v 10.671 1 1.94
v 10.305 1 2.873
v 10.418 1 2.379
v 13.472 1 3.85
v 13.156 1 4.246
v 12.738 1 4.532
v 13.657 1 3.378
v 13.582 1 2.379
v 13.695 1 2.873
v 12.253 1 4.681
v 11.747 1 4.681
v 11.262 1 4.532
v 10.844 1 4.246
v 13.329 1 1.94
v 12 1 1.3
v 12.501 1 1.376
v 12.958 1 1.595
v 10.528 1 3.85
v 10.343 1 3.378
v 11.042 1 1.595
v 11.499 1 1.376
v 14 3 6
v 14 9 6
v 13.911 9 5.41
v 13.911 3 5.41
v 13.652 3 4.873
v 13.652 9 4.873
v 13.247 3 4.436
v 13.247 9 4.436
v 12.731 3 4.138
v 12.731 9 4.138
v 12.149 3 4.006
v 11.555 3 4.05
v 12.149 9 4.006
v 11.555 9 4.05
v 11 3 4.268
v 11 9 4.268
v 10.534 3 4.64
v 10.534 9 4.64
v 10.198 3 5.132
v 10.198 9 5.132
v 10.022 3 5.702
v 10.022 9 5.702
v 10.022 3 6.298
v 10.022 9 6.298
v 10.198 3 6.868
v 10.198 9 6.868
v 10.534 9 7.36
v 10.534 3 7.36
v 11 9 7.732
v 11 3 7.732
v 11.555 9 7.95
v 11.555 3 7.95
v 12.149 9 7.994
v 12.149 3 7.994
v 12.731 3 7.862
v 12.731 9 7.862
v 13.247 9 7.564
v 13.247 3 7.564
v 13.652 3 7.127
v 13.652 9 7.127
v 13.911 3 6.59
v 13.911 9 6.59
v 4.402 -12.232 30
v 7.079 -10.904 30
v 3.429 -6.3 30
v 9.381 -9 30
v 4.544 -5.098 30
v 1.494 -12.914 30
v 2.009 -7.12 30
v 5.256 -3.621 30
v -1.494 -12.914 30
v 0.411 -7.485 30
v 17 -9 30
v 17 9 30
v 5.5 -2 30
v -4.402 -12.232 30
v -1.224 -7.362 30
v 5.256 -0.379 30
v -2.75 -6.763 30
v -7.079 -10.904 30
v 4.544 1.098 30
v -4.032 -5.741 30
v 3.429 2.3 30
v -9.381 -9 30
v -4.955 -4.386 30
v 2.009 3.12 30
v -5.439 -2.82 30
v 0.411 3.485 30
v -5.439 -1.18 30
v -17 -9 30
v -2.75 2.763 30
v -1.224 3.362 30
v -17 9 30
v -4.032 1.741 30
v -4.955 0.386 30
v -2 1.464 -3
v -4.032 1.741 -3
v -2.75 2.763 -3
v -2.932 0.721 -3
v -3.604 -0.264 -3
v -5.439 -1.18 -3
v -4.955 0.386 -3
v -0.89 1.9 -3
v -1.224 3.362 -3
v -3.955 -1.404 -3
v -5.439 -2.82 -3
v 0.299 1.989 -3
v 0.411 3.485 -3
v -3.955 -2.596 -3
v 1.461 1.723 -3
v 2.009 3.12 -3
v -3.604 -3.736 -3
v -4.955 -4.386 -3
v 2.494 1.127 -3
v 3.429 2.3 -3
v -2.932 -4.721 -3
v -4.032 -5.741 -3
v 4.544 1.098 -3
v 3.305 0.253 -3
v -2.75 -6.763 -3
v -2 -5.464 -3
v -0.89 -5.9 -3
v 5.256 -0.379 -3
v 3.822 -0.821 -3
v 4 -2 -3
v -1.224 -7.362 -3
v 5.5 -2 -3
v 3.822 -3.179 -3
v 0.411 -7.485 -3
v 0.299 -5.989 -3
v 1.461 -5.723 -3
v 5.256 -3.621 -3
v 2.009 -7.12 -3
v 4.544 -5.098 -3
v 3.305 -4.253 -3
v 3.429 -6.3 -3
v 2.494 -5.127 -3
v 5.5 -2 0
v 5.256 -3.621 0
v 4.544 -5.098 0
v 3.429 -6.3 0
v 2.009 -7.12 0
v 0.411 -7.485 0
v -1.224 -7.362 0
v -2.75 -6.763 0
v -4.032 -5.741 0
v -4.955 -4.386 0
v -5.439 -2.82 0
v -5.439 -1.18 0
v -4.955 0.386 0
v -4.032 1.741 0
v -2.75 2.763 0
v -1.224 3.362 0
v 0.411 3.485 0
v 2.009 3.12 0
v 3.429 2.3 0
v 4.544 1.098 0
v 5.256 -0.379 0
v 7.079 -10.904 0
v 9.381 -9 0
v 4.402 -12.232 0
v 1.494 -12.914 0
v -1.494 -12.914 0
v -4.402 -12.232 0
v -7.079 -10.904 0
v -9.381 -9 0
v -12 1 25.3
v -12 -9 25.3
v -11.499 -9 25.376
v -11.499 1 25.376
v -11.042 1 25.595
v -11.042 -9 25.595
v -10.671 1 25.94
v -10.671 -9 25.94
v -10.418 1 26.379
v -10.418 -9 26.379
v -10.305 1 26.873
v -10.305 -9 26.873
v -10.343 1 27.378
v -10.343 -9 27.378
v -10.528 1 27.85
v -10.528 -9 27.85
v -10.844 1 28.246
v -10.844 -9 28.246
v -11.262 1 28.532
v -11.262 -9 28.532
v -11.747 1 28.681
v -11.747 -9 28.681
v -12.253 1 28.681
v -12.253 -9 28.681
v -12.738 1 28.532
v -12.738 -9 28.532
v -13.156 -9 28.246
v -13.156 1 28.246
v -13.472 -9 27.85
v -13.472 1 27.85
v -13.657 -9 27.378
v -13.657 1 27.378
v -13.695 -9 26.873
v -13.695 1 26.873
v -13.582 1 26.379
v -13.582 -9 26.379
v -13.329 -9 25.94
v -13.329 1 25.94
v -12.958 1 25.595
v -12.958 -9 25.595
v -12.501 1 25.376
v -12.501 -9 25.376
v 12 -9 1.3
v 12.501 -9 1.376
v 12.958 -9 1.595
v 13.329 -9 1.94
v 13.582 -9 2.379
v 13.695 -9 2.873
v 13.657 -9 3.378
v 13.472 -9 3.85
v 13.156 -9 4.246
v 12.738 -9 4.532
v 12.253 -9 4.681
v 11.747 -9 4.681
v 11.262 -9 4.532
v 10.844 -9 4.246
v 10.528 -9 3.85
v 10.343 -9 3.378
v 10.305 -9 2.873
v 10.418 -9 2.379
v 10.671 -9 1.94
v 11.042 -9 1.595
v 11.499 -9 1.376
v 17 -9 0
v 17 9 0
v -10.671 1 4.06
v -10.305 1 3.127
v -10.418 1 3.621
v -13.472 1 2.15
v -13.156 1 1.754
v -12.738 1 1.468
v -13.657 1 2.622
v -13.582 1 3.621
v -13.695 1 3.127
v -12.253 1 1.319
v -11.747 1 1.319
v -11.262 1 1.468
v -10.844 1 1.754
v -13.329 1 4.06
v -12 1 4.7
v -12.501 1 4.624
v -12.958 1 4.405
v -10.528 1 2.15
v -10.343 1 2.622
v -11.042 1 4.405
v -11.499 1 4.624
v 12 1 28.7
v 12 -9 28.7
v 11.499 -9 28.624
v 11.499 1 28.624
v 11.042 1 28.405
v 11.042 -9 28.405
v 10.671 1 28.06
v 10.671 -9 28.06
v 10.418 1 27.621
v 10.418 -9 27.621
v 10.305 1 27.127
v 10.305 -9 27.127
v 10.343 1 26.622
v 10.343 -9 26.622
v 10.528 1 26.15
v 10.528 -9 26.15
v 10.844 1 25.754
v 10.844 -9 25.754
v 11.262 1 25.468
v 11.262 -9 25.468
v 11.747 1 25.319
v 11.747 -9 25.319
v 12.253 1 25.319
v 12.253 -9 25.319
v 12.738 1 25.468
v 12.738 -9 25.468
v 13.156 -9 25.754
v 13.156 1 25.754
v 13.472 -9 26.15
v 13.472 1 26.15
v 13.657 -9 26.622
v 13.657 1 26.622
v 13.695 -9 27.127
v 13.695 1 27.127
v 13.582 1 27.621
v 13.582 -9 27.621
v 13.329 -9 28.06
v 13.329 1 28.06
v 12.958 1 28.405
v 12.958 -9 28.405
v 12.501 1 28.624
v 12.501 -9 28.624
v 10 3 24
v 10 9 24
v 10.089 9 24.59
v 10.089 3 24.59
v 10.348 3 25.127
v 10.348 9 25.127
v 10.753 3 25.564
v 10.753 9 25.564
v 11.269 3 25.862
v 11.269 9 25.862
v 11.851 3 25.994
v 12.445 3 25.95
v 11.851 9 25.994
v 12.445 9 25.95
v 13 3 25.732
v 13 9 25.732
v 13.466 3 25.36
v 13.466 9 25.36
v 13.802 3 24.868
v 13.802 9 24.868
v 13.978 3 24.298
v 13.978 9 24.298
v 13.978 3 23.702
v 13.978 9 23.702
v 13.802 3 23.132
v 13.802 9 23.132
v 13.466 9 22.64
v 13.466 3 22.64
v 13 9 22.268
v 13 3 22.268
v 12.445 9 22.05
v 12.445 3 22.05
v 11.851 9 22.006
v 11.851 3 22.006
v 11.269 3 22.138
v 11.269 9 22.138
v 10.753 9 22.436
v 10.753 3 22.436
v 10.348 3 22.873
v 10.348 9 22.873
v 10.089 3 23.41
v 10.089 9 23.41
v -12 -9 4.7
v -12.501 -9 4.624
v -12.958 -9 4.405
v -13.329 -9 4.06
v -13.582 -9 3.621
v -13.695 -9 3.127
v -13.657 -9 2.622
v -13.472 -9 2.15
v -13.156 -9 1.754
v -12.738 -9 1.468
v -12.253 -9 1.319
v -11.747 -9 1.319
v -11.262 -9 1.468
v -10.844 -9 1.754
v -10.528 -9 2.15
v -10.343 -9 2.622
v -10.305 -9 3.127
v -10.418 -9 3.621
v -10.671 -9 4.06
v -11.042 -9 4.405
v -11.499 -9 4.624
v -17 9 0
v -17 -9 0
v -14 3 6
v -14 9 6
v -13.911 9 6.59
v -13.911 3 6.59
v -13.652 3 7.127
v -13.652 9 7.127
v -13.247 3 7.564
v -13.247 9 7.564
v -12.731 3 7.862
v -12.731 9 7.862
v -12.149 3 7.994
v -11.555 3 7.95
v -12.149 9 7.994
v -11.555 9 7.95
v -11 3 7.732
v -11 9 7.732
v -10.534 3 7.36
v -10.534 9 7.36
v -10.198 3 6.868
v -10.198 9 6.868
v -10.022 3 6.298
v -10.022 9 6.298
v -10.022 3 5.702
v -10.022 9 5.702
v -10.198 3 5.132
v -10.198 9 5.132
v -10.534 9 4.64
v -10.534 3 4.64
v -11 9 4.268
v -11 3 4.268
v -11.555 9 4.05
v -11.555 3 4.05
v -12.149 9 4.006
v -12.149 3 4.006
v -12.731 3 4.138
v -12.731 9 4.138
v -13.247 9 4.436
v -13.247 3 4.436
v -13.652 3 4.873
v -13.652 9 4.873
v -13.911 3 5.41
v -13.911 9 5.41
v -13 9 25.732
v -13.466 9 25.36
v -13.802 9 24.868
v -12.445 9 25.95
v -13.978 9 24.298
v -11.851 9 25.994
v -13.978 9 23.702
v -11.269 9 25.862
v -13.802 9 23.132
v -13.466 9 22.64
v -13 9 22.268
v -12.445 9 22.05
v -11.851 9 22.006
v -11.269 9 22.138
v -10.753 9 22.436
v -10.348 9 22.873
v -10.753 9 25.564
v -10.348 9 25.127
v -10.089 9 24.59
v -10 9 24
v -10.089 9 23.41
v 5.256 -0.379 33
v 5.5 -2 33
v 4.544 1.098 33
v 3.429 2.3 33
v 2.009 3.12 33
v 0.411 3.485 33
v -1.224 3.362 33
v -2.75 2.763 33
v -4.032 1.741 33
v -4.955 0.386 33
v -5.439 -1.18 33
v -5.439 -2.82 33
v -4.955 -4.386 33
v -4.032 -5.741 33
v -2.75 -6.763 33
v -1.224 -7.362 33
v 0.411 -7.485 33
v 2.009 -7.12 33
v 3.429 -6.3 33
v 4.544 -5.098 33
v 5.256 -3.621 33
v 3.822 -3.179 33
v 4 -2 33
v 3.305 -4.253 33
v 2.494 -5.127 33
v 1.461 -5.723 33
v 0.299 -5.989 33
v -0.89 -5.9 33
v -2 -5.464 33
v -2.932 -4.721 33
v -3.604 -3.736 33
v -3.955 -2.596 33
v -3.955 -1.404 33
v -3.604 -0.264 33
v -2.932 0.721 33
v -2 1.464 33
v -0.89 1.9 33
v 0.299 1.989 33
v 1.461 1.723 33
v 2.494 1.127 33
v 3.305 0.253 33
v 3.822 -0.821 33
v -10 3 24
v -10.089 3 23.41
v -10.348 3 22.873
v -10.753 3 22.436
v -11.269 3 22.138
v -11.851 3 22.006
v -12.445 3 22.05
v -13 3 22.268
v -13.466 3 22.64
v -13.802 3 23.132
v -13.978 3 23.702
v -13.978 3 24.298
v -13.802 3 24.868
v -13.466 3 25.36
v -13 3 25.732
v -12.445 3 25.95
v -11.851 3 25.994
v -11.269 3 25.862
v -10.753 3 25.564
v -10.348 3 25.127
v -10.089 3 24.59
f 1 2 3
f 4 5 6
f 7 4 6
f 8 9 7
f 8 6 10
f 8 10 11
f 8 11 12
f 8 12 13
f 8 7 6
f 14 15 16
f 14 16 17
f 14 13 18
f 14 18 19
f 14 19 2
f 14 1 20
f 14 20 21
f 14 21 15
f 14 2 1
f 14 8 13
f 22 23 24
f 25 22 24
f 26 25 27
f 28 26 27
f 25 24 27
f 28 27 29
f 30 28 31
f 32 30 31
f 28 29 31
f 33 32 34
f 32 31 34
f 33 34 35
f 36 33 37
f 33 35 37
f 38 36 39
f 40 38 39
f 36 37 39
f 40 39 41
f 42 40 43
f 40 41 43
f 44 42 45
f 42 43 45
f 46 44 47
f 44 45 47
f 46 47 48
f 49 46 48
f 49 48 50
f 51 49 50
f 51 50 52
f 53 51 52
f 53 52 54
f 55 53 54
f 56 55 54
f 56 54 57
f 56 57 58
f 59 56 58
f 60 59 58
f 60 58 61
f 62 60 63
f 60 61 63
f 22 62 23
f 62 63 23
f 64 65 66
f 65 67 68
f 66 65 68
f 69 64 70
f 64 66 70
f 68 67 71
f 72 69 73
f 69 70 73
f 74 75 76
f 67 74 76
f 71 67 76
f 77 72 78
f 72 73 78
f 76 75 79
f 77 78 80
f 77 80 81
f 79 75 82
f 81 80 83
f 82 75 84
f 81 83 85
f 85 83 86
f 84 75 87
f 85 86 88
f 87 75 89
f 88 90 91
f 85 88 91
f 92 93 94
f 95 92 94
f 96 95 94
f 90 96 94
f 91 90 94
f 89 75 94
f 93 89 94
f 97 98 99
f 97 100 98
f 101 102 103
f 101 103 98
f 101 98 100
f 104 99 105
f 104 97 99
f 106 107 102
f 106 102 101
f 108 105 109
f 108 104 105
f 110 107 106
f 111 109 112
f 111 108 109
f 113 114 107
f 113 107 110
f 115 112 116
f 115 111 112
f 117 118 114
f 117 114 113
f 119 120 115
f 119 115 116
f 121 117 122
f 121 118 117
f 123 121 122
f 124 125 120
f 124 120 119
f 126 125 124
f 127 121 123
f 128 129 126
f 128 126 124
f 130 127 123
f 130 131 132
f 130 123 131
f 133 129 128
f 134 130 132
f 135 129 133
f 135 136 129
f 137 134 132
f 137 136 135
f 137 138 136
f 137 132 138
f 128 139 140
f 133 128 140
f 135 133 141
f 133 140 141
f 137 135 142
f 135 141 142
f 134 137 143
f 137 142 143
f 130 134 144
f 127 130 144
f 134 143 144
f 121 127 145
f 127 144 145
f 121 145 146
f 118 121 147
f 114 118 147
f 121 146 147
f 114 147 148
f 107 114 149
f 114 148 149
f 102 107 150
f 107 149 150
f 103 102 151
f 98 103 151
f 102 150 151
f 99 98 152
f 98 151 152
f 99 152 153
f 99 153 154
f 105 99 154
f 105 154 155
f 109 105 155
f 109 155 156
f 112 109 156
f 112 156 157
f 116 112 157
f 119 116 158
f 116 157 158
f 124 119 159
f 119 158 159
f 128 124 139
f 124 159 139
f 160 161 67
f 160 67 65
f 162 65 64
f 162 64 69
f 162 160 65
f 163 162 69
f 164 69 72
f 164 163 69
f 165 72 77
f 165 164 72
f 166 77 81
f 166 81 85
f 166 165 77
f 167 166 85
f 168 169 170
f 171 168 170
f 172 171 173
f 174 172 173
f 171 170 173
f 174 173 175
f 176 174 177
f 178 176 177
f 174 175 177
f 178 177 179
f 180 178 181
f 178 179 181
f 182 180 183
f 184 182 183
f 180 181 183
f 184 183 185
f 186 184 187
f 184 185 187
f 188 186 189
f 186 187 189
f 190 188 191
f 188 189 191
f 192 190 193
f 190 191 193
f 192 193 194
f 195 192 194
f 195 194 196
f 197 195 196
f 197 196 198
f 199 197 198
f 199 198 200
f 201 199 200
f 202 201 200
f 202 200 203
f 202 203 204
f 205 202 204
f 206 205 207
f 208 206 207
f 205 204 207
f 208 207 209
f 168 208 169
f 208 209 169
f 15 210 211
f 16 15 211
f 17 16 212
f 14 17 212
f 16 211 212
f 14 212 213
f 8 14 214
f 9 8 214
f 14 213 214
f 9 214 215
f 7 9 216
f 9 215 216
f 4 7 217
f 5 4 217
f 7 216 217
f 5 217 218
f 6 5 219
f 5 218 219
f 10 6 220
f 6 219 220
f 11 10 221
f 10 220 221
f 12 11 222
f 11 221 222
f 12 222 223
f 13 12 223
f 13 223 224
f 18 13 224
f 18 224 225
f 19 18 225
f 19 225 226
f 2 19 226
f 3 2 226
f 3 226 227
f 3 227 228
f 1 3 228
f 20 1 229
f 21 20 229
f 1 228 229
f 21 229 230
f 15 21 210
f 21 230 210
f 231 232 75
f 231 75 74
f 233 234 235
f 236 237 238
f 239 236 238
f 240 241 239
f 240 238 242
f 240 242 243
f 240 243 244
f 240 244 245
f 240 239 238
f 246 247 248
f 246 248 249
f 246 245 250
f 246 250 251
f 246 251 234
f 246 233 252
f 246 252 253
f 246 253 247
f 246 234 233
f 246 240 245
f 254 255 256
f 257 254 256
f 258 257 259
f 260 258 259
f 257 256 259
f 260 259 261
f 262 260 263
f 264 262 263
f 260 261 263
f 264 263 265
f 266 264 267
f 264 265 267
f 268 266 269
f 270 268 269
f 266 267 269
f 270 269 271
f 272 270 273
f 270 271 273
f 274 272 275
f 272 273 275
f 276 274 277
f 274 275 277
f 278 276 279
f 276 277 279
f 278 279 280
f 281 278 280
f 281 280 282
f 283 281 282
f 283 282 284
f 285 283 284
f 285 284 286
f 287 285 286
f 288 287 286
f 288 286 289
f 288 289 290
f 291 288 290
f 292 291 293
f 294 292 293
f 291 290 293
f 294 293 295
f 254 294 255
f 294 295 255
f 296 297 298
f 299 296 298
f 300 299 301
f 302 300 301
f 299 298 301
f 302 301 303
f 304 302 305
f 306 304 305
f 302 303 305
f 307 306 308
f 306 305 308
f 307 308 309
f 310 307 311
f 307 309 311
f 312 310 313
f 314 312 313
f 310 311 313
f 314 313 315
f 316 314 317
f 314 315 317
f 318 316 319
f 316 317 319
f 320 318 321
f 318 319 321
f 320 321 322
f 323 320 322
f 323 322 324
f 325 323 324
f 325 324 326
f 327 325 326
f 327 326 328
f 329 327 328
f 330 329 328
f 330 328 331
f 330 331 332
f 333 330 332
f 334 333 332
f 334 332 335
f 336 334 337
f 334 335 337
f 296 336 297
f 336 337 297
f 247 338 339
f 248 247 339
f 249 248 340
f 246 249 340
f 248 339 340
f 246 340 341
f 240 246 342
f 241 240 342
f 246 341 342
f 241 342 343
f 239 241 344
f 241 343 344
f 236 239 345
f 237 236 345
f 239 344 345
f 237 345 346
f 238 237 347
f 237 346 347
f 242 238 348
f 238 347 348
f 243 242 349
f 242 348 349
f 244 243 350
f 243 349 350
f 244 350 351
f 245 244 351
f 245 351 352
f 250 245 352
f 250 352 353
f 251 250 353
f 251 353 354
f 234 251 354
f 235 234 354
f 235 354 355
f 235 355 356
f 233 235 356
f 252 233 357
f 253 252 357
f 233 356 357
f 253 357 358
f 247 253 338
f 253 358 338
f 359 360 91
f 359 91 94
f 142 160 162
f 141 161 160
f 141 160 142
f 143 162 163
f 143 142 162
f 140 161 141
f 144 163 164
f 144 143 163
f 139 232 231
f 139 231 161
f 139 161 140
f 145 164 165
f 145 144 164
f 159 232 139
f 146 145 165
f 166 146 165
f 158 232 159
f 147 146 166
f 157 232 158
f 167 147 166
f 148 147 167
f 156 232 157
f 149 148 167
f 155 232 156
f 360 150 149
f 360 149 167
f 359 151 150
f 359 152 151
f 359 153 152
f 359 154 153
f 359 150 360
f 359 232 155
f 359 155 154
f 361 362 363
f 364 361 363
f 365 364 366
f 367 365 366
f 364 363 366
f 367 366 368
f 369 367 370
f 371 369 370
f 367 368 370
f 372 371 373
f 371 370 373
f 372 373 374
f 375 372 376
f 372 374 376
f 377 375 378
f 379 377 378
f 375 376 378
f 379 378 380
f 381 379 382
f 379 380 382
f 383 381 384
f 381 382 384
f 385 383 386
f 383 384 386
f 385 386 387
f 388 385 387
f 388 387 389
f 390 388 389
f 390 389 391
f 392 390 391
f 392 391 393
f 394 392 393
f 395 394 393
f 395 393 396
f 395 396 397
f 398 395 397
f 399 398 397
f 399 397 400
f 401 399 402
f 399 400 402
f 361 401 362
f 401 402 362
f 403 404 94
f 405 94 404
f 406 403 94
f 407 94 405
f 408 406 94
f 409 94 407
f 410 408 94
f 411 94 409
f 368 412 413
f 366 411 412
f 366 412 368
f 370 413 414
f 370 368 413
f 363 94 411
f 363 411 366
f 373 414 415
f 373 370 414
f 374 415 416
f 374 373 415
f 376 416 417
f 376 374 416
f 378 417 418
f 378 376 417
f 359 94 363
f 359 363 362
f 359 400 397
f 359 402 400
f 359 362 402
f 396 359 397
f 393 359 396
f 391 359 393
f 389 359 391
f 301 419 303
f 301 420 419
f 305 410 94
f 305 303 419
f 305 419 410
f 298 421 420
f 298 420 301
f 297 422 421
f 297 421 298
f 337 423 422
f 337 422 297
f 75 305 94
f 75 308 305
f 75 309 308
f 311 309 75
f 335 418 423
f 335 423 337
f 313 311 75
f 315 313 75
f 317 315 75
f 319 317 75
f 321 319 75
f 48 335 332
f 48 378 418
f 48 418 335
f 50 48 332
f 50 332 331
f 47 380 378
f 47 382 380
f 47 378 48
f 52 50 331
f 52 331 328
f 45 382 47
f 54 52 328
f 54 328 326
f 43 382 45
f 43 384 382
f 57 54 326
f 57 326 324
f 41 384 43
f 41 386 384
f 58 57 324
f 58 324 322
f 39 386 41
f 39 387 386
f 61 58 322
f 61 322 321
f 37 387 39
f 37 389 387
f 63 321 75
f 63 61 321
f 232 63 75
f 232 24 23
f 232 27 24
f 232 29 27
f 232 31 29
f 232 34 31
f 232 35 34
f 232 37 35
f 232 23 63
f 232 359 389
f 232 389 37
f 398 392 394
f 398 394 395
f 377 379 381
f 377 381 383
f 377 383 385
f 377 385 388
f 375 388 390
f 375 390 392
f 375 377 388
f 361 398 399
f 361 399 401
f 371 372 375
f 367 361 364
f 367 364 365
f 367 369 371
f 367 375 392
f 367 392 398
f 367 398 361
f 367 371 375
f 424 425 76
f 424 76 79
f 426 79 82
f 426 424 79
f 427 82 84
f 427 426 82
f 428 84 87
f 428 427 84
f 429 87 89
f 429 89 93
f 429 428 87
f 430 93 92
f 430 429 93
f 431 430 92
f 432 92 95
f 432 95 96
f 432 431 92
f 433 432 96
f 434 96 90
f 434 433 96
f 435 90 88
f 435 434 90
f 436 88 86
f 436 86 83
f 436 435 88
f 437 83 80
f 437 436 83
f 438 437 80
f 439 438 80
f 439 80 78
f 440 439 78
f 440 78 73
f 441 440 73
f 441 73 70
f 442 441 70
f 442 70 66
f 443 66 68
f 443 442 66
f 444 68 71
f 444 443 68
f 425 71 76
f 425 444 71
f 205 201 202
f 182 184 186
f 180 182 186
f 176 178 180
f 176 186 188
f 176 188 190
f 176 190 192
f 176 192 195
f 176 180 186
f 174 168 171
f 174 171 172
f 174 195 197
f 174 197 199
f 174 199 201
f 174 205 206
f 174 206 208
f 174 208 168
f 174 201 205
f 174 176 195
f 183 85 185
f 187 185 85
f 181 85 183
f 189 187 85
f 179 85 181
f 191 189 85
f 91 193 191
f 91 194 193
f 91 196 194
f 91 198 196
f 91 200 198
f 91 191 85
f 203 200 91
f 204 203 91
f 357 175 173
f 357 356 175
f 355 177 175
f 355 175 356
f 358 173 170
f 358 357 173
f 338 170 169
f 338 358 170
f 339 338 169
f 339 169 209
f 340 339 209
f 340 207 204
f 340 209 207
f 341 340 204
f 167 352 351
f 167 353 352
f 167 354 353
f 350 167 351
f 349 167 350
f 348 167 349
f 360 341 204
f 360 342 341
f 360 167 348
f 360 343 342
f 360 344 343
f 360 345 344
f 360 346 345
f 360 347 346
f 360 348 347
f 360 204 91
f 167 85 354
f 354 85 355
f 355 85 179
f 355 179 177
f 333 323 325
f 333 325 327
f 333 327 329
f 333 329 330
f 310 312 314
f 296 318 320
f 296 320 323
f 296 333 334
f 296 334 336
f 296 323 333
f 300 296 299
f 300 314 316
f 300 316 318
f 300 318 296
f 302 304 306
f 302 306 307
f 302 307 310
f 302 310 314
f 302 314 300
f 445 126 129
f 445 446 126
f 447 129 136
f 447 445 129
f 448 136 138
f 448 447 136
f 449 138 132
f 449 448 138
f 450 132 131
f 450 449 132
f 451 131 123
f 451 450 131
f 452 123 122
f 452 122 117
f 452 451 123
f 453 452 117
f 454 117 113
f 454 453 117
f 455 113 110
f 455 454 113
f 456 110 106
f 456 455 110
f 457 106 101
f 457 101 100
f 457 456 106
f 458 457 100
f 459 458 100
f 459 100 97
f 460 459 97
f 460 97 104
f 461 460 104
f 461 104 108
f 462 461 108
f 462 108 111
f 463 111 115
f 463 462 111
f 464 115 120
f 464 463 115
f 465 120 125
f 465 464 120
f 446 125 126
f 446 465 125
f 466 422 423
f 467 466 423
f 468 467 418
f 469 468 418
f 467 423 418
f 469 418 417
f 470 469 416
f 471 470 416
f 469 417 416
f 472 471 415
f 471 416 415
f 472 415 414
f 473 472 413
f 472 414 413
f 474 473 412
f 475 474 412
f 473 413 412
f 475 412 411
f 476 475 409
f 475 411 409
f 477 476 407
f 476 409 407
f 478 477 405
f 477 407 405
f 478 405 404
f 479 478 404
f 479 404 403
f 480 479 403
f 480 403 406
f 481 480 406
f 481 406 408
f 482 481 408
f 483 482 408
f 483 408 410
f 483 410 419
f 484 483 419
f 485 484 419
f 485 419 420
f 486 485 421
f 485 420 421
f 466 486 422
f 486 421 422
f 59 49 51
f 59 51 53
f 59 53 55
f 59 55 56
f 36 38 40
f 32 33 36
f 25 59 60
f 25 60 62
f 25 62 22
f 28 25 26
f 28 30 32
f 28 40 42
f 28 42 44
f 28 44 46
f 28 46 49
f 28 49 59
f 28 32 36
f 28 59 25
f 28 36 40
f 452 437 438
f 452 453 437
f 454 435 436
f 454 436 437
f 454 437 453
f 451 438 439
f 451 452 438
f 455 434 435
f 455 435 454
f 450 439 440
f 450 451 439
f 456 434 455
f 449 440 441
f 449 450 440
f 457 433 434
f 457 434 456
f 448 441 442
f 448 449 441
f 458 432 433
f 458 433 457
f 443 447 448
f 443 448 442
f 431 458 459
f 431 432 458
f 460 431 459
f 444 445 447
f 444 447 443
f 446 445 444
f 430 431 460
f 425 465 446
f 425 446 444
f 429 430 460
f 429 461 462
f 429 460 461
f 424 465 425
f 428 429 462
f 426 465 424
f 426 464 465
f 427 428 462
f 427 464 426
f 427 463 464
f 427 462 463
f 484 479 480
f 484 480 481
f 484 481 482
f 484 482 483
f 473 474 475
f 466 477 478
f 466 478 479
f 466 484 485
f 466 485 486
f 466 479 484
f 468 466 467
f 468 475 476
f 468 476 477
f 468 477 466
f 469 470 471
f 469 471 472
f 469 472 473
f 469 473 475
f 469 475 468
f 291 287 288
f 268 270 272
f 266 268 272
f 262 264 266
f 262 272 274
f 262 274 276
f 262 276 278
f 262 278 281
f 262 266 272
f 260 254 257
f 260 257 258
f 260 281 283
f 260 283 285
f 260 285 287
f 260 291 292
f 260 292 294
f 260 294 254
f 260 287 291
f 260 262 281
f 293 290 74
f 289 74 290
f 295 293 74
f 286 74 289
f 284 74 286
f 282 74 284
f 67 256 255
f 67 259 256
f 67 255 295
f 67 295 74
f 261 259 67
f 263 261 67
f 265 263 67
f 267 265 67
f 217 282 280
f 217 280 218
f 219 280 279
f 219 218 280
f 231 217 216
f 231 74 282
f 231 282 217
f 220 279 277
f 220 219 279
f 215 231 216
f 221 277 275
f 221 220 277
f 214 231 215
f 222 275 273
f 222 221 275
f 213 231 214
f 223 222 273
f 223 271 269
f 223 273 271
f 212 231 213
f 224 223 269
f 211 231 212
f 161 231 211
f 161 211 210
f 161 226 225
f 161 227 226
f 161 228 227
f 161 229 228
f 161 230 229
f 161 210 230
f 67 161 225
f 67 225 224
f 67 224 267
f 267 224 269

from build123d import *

# Parameters (mm, degrees)
BOSS_EXTRUDE1_DEPTH = 30
CUT_EXTRUDE1_REACH  = 38.851
SKETCH5_R           = 4
BOSS_EXTRUDE2_START = 3
SKETCH6_R           = 5.5
SKETCH6_R_2         = 4
BOSS_EXTRUDE2_DEPTH = 3
SKETCH7_R           = 5.5
SKETCH7_R_2         = 4
BOSS_EXTRUDE3_DEPTH = 3
SKETCH8_R           = 2
CUT_EXTRUDE2_DEPTH  = 6
SKETCH9_R           = 1.7
CUT_EXTRUDE3_DEPTH  = 10


with BuildPart() as part:
    # Sketch1 → Boss-Extrude1 (new body)
    with BuildSketch(Plane.XY):
        with BuildLine():
            Line((-9.38083152, -9), (-17, -9))
            Line((-17, -9), (-17, 9))
            Line((-17, 9), (17, 9))
            Line((17, 9), (17, -9))
            Line((17, -9), (9.38083152, -9))
            ThreePointArc((9.38083152, -9), (0, -13), (-9.38083152, -9))
        make_face()
    extrude(amount=BOSS_EXTRUDE1_DEPTH)

    # Sketch5 → Cut-Extrude1 (cut, up to next)
    with BuildSketch(Plane.XY.offset(30), mode=Mode.PRIVATE) as cut_extrude1_sk1:
        with Locations((0, -2)):
            Circle(SKETCH5_R)
    cut_extrude1_tool1 = extrude(cut_extrude1_sk1.sketch, amount=-CUT_EXTRUDE1_REACH, mode=Mode.PRIVATE) & part.part
    add(cut_extrude1_tool1.solids().sort_by_distance((0, -2, 30))[0], mode=Mode.SUBTRACT)

    # Sketch6 → Boss-Extrude2 (add)
    with BuildSketch(Plane.XY.offset(30).offset(BOSS_EXTRUDE2_START)):
        with Locations((0, -2)):
            Circle(SKETCH6_R)
        with Locations((0, -2)):
            Circle(SKETCH6_R_2, mode=Mode.SUBTRACT)
    extrude(amount=-BOSS_EXTRUDE2_DEPTH)

    # Sketch7 → Boss-Extrude3 (add)
    with BuildSketch(Plane(origin=(0, 0, 0), x_dir=(-1, 0, 0), z_dir=(0, 0, -1))):
        with Locations(Location((0, -2, 0), (0, 0, 180))):
            Circle(SKETCH7_R)
        with Locations(Location((0, -2, 0), (0, 0, 180))):
            Circle(SKETCH7_R_2, mode=Mode.SUBTRACT)
    extrude(amount=BOSS_EXTRUDE3_DEPTH)

    # Sketch8 → Cut-Extrude2 (cut)
    with BuildSketch(Plane(origin=(0, 9, 0), x_dir=(1, 0, 0), z_dir=(0, 1, 0))):
        with Locations(Location((-12, -6, 0), (0, 0, 180))):
            Circle(SKETCH8_R)
        with Locations((-12, -24)):
            Circle(SKETCH8_R)
        with Locations(Location((12, -24, 0), (0, 0, 180))):
            Circle(SKETCH8_R)
        with Locations((12, -6)):
            Circle(SKETCH8_R)
    extrude(amount=-CUT_EXTRUDE2_DEPTH, mode=Mode.SUBTRACT)

    # Sketch9 → Cut-Extrude3 (cut)
    with BuildSketch(Plane.XZ.offset(9)):
        with Locations(Location((-12, 27, 0), (0, 0, 270))):
            Circle(SKETCH9_R)
        with Locations(Location((-12, 3, 0), (0, 0, 90))):
            Circle(SKETCH9_R)
        with Locations(Location((12, 3, 0), (0, 0, 270))):
            Circle(SKETCH9_R)
        with Locations(Location((12, 27, 0), (0, 0, 90))):
            Circle(SKETCH9_R)
    extrude(amount=-CUT_EXTRUDE3_DEPTH, mode=Mode.SUBTRACT)


solid = part.part
